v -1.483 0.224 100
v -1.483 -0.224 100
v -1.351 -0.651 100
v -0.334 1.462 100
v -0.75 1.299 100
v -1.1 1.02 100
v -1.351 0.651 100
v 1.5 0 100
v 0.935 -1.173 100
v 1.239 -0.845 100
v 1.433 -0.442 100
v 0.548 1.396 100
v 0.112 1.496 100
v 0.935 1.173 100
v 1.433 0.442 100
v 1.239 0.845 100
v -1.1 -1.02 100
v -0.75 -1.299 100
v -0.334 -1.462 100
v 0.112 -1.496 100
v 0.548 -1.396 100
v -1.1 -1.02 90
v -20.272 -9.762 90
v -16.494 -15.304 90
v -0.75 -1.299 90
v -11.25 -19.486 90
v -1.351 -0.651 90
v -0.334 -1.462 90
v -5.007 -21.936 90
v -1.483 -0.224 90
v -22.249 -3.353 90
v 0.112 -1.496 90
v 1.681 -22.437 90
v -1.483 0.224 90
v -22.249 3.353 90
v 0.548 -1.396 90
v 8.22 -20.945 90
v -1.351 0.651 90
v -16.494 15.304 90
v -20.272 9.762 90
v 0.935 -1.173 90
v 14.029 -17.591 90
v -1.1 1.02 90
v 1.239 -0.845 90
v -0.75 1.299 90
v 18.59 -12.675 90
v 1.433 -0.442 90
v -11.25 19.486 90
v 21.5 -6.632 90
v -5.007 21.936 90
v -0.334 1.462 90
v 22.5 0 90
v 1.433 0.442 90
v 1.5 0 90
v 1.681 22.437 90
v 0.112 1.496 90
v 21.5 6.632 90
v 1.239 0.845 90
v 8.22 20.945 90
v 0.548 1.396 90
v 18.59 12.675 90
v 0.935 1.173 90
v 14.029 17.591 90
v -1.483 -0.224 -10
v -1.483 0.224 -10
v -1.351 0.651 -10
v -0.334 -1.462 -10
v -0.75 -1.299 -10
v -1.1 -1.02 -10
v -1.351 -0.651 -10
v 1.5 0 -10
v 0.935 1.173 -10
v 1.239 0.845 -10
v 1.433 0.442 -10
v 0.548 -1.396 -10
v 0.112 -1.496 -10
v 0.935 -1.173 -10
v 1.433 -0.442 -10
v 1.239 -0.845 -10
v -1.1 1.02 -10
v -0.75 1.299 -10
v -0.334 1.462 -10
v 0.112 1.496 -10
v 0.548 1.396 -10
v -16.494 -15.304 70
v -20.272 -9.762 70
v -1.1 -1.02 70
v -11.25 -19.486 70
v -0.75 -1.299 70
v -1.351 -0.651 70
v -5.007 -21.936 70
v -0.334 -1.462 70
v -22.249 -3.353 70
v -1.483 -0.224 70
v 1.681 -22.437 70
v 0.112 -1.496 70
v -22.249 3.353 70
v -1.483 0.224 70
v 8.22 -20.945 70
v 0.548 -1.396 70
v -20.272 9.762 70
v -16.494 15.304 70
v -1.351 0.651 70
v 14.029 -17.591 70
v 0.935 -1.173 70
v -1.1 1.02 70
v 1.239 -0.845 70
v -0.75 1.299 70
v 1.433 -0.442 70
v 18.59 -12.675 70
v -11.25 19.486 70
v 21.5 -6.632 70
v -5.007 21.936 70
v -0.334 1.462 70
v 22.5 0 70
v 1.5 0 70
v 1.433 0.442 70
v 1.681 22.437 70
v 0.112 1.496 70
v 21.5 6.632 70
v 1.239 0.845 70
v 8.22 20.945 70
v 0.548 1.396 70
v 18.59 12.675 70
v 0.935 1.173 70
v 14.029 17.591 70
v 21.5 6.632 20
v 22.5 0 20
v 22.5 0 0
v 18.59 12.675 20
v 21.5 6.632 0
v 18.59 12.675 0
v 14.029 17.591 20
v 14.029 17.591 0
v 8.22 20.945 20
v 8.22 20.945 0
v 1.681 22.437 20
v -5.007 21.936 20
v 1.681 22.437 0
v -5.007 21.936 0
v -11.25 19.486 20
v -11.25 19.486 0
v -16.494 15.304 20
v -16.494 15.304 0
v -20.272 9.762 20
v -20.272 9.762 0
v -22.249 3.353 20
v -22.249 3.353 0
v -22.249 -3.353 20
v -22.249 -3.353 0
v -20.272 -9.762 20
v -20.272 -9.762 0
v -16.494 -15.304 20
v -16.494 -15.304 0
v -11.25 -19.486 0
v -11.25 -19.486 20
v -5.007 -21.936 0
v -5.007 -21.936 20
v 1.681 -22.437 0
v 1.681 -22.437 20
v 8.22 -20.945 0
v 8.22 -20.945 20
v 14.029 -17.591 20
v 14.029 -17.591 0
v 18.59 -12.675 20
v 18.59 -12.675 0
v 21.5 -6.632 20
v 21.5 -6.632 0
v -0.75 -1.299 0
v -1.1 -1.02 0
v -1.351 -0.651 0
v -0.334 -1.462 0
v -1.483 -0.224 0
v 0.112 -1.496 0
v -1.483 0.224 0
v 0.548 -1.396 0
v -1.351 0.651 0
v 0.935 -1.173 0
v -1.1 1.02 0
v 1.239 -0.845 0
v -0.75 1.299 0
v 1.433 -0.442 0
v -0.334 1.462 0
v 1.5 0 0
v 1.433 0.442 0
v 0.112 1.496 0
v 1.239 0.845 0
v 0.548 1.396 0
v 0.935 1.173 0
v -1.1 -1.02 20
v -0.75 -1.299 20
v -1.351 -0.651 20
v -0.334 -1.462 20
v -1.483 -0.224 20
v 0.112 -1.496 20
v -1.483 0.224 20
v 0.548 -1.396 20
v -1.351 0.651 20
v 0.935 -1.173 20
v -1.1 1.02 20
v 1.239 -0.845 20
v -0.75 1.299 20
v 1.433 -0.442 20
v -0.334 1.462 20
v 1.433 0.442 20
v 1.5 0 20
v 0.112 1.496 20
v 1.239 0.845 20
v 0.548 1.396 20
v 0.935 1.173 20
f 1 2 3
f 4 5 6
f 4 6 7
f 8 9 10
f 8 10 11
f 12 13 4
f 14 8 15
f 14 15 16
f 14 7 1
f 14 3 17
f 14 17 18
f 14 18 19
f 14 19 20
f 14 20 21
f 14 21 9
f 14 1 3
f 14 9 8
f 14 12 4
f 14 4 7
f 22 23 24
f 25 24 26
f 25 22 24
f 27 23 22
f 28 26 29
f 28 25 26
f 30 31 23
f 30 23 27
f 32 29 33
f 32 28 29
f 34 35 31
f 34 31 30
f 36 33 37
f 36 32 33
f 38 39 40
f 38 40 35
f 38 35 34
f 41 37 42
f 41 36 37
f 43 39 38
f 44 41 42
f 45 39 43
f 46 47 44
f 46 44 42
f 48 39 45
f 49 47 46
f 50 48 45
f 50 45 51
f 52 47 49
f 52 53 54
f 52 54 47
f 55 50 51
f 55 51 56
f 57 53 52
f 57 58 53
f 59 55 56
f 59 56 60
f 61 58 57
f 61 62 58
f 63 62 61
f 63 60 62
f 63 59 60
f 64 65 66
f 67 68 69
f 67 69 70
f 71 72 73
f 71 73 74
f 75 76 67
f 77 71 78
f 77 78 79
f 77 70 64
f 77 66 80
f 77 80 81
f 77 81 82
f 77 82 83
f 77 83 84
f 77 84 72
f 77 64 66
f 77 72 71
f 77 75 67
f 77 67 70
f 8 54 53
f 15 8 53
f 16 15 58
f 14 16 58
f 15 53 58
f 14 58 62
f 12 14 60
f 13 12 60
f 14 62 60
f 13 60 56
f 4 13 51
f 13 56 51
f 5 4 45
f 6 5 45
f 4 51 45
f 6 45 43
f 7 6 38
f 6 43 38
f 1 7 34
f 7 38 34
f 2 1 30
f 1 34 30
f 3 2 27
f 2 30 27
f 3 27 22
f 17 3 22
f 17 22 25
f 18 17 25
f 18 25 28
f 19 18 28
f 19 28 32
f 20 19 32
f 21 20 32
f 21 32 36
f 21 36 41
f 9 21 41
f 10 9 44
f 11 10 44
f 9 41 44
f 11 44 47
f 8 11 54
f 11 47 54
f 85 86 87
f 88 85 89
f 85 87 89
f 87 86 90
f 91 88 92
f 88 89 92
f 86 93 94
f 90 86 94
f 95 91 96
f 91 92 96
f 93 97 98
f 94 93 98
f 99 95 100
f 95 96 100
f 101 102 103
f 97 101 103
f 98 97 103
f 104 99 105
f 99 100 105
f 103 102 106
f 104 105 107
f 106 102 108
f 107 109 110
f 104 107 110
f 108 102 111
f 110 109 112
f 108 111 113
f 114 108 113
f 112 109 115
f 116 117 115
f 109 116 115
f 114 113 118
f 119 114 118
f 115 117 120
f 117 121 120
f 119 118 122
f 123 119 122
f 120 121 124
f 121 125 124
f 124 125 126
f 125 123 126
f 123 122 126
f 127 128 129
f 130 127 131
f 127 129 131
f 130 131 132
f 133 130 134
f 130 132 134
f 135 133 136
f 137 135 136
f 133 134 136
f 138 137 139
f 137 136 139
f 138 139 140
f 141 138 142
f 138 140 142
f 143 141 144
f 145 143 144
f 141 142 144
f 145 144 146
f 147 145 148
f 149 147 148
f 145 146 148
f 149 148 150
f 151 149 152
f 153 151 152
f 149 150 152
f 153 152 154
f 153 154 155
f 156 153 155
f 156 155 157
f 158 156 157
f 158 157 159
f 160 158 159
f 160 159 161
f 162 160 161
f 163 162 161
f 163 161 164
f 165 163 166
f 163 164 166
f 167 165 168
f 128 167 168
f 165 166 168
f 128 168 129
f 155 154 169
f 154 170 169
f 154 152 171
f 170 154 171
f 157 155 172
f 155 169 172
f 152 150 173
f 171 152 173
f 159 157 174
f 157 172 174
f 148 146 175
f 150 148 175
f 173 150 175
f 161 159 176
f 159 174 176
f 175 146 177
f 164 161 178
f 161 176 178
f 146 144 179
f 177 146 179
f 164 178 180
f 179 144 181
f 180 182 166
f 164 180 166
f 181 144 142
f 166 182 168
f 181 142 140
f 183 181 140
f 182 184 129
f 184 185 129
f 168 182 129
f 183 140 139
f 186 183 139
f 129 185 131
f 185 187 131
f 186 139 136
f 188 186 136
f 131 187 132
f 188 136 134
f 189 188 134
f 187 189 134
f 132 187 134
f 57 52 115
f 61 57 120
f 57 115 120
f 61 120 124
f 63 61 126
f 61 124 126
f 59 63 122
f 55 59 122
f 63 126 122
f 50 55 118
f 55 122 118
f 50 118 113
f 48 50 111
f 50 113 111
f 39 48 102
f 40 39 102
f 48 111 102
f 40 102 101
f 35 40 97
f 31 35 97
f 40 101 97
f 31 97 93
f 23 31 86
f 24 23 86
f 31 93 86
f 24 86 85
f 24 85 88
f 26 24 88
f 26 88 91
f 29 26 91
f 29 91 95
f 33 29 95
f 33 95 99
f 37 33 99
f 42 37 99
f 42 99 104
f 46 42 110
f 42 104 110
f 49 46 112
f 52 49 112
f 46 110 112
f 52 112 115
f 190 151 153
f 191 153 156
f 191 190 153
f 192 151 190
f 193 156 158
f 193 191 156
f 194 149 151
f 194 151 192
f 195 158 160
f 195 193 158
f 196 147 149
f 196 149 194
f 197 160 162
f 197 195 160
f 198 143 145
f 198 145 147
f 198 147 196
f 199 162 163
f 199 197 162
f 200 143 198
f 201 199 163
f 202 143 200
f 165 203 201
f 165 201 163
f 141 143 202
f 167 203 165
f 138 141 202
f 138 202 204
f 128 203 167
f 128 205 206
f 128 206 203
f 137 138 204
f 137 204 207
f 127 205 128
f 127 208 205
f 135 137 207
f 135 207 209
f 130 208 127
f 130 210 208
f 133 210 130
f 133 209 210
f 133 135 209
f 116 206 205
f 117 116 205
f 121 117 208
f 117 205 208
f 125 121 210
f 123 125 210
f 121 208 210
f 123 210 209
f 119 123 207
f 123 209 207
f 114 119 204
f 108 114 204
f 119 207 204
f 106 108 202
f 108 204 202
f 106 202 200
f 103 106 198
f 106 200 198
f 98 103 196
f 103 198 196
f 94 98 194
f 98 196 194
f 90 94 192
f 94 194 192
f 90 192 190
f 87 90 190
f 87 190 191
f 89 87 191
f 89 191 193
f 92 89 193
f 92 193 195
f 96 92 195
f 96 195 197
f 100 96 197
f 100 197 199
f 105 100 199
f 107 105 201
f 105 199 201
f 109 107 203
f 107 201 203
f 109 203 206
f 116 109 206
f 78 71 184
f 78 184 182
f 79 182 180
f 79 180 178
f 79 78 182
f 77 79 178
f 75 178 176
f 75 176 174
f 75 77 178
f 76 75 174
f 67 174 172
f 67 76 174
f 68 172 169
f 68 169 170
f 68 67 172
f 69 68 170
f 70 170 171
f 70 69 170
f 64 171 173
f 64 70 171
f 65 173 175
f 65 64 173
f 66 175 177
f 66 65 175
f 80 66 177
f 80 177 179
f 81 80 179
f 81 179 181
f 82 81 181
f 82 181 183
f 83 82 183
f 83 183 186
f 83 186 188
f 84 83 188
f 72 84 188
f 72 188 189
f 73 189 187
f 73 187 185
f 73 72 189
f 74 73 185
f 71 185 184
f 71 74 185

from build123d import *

# Parameters (mm, degrees)
ESBO_O1_R                = 22.5
RESSALTO_EXTRUS_O3_DEPTH = 20
ESBO_O3_R                = 1.5
RESSALTO_EXTRUS_O4_DEPTH = 50
ESBO_O4_R                = 22.5
RESSALTO_EXTRUS_O5_DEPTH = 20
ESBO_O5_R                = 1.5
RESSALTO_EXTRUS_O6_DEPTH = 10
RESSALTO_EXTRUS_O7_START = 10
ESBO_O6_R                = 1.5
RESSALTO_EXTRUS_O7_DEPTH = 10


with BuildPart() as part:
    # Esboço1 → Ressalto-extrusão3 (new body)
    with BuildSketch(Plane.XY):
        Circle(ESBO_O1_R)
    extrude(amount=RESSALTO_EXTRUS_O3_DEPTH)

    # Esboço3 → Ressalto-extrusão4 (add)
    with BuildSketch(Plane.XY.offset(20)):
        Circle(ESBO_O3_R)
    extrude(amount=RESSALTO_EXTRUS_O4_DEPTH)

    # Esboço4 → Ressalto-extrusão5 (add)
    with BuildSketch(Plane.XY.offset(70)):
        Circle(ESBO_O4_R)
    extrude(amount=RESSALTO_EXTRUS_O5_DEPTH)

    # Esboço5 → Ressalto-extrusão6 (add)
    with BuildSketch(Plane.XY.offset(90)):
        Circle(ESBO_O5_R)
    extrude(amount=RESSALTO_EXTRUS_O6_DEPTH)

    # Esboço6 → Ressalto-extrusão7 (add)
    with BuildSketch(Plane(origin=(0, 0, 0), x_dir=(-1, 0, 0), z_dir=(0, 0, -1)).offset(RESSALTO_EXTRUS_O7_START)):
        with Locations(Location((0, 0, 0), (0, 0, 180))):
            Circle(ESBO_O6_R)
    extrude(amount=-RESSALTO_EXTRUS_O7_DEPTH)


solid = part.part
